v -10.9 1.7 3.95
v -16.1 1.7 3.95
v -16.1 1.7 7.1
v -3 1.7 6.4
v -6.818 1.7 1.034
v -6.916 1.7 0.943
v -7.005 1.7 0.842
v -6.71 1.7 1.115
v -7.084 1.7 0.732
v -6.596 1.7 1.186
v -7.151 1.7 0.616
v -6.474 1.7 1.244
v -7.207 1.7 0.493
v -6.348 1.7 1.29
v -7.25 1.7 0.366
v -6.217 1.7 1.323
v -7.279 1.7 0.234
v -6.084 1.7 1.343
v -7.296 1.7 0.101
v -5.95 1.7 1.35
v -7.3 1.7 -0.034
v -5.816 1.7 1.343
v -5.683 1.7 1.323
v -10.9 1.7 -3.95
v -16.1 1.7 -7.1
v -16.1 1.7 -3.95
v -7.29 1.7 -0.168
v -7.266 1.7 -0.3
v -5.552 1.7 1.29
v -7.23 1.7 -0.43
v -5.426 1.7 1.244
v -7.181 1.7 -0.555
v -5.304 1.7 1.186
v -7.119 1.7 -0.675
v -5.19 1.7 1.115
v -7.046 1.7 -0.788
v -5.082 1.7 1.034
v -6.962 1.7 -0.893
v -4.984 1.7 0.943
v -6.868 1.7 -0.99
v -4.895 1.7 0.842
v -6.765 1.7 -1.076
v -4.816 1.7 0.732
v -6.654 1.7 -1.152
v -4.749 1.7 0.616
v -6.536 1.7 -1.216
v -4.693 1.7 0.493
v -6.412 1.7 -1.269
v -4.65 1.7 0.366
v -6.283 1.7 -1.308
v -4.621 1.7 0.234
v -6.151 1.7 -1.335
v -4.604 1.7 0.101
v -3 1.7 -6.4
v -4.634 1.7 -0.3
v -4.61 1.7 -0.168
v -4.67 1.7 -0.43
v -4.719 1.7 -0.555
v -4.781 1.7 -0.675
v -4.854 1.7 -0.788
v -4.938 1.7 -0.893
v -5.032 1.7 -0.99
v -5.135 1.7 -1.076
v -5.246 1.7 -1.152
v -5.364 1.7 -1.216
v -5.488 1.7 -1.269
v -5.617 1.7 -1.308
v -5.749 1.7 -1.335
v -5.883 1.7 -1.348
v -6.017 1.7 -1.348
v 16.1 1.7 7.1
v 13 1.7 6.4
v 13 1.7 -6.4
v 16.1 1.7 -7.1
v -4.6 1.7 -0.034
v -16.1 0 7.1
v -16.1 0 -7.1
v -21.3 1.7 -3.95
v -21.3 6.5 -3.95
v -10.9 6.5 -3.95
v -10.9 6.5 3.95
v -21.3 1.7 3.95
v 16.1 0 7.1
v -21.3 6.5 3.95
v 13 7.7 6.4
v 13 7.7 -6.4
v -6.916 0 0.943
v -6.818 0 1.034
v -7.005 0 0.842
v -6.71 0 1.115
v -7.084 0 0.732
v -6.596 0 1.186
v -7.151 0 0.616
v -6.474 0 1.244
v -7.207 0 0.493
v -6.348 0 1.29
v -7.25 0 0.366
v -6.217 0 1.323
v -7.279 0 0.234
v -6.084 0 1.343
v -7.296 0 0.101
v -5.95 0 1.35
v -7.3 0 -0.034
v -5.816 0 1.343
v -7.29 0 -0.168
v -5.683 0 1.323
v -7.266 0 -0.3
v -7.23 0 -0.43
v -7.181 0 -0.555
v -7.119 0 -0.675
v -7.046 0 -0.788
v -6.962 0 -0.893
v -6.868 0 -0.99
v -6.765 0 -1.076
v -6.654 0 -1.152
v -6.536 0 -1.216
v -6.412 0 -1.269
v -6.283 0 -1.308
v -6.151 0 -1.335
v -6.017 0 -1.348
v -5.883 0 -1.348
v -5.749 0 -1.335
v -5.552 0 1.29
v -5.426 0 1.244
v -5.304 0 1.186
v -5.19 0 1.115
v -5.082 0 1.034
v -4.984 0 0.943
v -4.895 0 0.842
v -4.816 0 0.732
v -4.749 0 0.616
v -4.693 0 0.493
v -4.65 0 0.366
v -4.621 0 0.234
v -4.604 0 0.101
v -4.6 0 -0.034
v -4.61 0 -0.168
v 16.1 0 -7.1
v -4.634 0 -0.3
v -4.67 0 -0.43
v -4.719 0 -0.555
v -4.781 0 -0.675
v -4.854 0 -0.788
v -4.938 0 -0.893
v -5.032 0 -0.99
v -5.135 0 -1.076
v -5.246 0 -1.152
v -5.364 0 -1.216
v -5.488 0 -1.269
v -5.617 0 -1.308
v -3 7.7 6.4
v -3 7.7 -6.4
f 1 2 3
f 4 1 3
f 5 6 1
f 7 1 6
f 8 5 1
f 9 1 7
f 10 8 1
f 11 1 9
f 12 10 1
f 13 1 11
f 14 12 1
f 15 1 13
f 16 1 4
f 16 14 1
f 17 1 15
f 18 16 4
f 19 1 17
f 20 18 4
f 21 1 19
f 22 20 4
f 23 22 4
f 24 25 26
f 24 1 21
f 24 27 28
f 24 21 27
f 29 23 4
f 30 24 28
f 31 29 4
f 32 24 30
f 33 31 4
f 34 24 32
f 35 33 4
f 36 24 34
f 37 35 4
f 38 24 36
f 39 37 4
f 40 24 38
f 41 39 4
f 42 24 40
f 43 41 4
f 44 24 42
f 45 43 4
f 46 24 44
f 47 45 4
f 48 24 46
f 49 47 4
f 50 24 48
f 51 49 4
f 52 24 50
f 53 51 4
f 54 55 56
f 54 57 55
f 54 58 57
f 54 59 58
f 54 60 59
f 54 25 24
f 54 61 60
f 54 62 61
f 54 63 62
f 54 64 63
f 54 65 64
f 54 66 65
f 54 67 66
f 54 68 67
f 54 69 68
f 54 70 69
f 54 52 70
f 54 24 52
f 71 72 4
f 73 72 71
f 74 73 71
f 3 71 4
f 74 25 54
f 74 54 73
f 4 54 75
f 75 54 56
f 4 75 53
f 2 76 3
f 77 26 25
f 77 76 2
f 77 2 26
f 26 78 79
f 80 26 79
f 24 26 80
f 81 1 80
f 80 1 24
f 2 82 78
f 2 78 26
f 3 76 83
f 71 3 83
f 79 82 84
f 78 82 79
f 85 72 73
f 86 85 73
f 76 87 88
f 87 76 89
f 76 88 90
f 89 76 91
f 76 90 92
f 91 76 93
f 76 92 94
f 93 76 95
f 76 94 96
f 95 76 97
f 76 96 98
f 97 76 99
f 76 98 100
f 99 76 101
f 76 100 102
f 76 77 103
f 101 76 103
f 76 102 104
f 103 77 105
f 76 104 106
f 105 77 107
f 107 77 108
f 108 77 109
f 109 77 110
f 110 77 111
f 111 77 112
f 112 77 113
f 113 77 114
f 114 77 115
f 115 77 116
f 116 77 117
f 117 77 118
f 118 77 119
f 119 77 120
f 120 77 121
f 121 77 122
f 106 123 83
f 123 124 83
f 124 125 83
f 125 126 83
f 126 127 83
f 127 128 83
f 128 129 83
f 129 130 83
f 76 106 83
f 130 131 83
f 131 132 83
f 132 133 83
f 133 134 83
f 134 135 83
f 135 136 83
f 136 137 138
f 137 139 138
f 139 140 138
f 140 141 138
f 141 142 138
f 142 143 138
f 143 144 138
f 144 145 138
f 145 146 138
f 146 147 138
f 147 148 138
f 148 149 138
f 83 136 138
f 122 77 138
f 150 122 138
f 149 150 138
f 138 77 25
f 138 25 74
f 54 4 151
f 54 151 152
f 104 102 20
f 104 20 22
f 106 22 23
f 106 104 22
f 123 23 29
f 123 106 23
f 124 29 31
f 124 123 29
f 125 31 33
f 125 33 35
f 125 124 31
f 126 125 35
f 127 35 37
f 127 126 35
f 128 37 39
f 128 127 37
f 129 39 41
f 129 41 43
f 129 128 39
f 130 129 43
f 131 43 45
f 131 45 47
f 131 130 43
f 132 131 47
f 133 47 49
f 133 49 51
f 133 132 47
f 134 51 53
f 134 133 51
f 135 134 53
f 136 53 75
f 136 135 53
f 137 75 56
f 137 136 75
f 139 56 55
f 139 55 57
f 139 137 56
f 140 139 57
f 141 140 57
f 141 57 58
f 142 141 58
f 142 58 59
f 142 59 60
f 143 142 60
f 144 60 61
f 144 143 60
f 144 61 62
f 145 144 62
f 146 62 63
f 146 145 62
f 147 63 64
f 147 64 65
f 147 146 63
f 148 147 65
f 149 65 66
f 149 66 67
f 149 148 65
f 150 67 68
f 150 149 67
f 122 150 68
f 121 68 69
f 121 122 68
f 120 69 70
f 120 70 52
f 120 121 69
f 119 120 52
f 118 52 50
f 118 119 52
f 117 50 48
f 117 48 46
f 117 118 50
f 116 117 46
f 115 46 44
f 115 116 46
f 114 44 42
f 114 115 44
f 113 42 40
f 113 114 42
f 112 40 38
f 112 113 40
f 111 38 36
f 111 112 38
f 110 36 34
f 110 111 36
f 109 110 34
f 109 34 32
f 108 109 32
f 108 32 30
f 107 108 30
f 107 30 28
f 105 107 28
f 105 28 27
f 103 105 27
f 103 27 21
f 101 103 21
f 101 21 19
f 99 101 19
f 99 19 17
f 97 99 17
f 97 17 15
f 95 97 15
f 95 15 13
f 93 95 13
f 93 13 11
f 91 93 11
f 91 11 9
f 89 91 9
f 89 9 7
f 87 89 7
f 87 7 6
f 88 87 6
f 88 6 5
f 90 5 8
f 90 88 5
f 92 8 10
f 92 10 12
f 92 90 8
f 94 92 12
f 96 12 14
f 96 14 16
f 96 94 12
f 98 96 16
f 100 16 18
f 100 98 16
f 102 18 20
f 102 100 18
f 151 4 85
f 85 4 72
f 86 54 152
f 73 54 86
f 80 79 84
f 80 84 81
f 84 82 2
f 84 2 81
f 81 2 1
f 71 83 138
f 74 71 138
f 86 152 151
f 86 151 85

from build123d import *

# Parameters (mm, degrees)
SKETCH1_W           = 32.2
SKETCH1_H           = 14.2
SKETCH1_R           = 1.35
BOSS_EXTRUDE1_DEPTH = 1.7
SKETCH2_W           = 16
SKETCH2_H           = 12.8
BOSS_EXTRUDE2_DEPTH = 6
SKETCH3_W           = 10.4
SKETCH3_H           = 7.9
BOSS_EXTRUDE3_DEPTH = 4.8


with BuildPart() as part:
    # Sketch1 → Boss-Extrude1 (new body)
    with BuildSketch(Plane(origin=(0, 0, 0), x_dir=(1, 0, 0), z_dir=(0, 1, 0))):
        Rectangle(SKETCH1_W, SKETCH1_H)
        with Locations(Location((-5.95, 0, 0), (0, 0, 270))):
            Circle(SKETCH1_R, mode=Mode.SUBTRACT)
    extrude(amount=BOSS_EXTRUDE1_DEPTH)

    # Sketch2 → Boss-Extrude2 (add)
    with BuildSketch(Plane(origin=(0, 1.7, 0), x_dir=(1, 0, 0), z_dir=(0, 1, 0))):
        with Locations((5, 0)):
            Rectangle(SKETCH2_W, SKETCH2_H)
    extrude(amount=BOSS_EXTRUDE2_DEPTH)

    # Sketch3 → Boss-Extrude3 (add)
    with BuildSketch(Plane(origin=(0, 1.7, 0), x_dir=(1, 0, 0), z_dir=(0, 1, 0))):
        with Locations((-16.1, 0)):
            Rectangle(SKETCH3_W, SKETCH3_H)
    extrude(amount=BOSS_EXTRUDE3_DEPTH)


solid = part.part
